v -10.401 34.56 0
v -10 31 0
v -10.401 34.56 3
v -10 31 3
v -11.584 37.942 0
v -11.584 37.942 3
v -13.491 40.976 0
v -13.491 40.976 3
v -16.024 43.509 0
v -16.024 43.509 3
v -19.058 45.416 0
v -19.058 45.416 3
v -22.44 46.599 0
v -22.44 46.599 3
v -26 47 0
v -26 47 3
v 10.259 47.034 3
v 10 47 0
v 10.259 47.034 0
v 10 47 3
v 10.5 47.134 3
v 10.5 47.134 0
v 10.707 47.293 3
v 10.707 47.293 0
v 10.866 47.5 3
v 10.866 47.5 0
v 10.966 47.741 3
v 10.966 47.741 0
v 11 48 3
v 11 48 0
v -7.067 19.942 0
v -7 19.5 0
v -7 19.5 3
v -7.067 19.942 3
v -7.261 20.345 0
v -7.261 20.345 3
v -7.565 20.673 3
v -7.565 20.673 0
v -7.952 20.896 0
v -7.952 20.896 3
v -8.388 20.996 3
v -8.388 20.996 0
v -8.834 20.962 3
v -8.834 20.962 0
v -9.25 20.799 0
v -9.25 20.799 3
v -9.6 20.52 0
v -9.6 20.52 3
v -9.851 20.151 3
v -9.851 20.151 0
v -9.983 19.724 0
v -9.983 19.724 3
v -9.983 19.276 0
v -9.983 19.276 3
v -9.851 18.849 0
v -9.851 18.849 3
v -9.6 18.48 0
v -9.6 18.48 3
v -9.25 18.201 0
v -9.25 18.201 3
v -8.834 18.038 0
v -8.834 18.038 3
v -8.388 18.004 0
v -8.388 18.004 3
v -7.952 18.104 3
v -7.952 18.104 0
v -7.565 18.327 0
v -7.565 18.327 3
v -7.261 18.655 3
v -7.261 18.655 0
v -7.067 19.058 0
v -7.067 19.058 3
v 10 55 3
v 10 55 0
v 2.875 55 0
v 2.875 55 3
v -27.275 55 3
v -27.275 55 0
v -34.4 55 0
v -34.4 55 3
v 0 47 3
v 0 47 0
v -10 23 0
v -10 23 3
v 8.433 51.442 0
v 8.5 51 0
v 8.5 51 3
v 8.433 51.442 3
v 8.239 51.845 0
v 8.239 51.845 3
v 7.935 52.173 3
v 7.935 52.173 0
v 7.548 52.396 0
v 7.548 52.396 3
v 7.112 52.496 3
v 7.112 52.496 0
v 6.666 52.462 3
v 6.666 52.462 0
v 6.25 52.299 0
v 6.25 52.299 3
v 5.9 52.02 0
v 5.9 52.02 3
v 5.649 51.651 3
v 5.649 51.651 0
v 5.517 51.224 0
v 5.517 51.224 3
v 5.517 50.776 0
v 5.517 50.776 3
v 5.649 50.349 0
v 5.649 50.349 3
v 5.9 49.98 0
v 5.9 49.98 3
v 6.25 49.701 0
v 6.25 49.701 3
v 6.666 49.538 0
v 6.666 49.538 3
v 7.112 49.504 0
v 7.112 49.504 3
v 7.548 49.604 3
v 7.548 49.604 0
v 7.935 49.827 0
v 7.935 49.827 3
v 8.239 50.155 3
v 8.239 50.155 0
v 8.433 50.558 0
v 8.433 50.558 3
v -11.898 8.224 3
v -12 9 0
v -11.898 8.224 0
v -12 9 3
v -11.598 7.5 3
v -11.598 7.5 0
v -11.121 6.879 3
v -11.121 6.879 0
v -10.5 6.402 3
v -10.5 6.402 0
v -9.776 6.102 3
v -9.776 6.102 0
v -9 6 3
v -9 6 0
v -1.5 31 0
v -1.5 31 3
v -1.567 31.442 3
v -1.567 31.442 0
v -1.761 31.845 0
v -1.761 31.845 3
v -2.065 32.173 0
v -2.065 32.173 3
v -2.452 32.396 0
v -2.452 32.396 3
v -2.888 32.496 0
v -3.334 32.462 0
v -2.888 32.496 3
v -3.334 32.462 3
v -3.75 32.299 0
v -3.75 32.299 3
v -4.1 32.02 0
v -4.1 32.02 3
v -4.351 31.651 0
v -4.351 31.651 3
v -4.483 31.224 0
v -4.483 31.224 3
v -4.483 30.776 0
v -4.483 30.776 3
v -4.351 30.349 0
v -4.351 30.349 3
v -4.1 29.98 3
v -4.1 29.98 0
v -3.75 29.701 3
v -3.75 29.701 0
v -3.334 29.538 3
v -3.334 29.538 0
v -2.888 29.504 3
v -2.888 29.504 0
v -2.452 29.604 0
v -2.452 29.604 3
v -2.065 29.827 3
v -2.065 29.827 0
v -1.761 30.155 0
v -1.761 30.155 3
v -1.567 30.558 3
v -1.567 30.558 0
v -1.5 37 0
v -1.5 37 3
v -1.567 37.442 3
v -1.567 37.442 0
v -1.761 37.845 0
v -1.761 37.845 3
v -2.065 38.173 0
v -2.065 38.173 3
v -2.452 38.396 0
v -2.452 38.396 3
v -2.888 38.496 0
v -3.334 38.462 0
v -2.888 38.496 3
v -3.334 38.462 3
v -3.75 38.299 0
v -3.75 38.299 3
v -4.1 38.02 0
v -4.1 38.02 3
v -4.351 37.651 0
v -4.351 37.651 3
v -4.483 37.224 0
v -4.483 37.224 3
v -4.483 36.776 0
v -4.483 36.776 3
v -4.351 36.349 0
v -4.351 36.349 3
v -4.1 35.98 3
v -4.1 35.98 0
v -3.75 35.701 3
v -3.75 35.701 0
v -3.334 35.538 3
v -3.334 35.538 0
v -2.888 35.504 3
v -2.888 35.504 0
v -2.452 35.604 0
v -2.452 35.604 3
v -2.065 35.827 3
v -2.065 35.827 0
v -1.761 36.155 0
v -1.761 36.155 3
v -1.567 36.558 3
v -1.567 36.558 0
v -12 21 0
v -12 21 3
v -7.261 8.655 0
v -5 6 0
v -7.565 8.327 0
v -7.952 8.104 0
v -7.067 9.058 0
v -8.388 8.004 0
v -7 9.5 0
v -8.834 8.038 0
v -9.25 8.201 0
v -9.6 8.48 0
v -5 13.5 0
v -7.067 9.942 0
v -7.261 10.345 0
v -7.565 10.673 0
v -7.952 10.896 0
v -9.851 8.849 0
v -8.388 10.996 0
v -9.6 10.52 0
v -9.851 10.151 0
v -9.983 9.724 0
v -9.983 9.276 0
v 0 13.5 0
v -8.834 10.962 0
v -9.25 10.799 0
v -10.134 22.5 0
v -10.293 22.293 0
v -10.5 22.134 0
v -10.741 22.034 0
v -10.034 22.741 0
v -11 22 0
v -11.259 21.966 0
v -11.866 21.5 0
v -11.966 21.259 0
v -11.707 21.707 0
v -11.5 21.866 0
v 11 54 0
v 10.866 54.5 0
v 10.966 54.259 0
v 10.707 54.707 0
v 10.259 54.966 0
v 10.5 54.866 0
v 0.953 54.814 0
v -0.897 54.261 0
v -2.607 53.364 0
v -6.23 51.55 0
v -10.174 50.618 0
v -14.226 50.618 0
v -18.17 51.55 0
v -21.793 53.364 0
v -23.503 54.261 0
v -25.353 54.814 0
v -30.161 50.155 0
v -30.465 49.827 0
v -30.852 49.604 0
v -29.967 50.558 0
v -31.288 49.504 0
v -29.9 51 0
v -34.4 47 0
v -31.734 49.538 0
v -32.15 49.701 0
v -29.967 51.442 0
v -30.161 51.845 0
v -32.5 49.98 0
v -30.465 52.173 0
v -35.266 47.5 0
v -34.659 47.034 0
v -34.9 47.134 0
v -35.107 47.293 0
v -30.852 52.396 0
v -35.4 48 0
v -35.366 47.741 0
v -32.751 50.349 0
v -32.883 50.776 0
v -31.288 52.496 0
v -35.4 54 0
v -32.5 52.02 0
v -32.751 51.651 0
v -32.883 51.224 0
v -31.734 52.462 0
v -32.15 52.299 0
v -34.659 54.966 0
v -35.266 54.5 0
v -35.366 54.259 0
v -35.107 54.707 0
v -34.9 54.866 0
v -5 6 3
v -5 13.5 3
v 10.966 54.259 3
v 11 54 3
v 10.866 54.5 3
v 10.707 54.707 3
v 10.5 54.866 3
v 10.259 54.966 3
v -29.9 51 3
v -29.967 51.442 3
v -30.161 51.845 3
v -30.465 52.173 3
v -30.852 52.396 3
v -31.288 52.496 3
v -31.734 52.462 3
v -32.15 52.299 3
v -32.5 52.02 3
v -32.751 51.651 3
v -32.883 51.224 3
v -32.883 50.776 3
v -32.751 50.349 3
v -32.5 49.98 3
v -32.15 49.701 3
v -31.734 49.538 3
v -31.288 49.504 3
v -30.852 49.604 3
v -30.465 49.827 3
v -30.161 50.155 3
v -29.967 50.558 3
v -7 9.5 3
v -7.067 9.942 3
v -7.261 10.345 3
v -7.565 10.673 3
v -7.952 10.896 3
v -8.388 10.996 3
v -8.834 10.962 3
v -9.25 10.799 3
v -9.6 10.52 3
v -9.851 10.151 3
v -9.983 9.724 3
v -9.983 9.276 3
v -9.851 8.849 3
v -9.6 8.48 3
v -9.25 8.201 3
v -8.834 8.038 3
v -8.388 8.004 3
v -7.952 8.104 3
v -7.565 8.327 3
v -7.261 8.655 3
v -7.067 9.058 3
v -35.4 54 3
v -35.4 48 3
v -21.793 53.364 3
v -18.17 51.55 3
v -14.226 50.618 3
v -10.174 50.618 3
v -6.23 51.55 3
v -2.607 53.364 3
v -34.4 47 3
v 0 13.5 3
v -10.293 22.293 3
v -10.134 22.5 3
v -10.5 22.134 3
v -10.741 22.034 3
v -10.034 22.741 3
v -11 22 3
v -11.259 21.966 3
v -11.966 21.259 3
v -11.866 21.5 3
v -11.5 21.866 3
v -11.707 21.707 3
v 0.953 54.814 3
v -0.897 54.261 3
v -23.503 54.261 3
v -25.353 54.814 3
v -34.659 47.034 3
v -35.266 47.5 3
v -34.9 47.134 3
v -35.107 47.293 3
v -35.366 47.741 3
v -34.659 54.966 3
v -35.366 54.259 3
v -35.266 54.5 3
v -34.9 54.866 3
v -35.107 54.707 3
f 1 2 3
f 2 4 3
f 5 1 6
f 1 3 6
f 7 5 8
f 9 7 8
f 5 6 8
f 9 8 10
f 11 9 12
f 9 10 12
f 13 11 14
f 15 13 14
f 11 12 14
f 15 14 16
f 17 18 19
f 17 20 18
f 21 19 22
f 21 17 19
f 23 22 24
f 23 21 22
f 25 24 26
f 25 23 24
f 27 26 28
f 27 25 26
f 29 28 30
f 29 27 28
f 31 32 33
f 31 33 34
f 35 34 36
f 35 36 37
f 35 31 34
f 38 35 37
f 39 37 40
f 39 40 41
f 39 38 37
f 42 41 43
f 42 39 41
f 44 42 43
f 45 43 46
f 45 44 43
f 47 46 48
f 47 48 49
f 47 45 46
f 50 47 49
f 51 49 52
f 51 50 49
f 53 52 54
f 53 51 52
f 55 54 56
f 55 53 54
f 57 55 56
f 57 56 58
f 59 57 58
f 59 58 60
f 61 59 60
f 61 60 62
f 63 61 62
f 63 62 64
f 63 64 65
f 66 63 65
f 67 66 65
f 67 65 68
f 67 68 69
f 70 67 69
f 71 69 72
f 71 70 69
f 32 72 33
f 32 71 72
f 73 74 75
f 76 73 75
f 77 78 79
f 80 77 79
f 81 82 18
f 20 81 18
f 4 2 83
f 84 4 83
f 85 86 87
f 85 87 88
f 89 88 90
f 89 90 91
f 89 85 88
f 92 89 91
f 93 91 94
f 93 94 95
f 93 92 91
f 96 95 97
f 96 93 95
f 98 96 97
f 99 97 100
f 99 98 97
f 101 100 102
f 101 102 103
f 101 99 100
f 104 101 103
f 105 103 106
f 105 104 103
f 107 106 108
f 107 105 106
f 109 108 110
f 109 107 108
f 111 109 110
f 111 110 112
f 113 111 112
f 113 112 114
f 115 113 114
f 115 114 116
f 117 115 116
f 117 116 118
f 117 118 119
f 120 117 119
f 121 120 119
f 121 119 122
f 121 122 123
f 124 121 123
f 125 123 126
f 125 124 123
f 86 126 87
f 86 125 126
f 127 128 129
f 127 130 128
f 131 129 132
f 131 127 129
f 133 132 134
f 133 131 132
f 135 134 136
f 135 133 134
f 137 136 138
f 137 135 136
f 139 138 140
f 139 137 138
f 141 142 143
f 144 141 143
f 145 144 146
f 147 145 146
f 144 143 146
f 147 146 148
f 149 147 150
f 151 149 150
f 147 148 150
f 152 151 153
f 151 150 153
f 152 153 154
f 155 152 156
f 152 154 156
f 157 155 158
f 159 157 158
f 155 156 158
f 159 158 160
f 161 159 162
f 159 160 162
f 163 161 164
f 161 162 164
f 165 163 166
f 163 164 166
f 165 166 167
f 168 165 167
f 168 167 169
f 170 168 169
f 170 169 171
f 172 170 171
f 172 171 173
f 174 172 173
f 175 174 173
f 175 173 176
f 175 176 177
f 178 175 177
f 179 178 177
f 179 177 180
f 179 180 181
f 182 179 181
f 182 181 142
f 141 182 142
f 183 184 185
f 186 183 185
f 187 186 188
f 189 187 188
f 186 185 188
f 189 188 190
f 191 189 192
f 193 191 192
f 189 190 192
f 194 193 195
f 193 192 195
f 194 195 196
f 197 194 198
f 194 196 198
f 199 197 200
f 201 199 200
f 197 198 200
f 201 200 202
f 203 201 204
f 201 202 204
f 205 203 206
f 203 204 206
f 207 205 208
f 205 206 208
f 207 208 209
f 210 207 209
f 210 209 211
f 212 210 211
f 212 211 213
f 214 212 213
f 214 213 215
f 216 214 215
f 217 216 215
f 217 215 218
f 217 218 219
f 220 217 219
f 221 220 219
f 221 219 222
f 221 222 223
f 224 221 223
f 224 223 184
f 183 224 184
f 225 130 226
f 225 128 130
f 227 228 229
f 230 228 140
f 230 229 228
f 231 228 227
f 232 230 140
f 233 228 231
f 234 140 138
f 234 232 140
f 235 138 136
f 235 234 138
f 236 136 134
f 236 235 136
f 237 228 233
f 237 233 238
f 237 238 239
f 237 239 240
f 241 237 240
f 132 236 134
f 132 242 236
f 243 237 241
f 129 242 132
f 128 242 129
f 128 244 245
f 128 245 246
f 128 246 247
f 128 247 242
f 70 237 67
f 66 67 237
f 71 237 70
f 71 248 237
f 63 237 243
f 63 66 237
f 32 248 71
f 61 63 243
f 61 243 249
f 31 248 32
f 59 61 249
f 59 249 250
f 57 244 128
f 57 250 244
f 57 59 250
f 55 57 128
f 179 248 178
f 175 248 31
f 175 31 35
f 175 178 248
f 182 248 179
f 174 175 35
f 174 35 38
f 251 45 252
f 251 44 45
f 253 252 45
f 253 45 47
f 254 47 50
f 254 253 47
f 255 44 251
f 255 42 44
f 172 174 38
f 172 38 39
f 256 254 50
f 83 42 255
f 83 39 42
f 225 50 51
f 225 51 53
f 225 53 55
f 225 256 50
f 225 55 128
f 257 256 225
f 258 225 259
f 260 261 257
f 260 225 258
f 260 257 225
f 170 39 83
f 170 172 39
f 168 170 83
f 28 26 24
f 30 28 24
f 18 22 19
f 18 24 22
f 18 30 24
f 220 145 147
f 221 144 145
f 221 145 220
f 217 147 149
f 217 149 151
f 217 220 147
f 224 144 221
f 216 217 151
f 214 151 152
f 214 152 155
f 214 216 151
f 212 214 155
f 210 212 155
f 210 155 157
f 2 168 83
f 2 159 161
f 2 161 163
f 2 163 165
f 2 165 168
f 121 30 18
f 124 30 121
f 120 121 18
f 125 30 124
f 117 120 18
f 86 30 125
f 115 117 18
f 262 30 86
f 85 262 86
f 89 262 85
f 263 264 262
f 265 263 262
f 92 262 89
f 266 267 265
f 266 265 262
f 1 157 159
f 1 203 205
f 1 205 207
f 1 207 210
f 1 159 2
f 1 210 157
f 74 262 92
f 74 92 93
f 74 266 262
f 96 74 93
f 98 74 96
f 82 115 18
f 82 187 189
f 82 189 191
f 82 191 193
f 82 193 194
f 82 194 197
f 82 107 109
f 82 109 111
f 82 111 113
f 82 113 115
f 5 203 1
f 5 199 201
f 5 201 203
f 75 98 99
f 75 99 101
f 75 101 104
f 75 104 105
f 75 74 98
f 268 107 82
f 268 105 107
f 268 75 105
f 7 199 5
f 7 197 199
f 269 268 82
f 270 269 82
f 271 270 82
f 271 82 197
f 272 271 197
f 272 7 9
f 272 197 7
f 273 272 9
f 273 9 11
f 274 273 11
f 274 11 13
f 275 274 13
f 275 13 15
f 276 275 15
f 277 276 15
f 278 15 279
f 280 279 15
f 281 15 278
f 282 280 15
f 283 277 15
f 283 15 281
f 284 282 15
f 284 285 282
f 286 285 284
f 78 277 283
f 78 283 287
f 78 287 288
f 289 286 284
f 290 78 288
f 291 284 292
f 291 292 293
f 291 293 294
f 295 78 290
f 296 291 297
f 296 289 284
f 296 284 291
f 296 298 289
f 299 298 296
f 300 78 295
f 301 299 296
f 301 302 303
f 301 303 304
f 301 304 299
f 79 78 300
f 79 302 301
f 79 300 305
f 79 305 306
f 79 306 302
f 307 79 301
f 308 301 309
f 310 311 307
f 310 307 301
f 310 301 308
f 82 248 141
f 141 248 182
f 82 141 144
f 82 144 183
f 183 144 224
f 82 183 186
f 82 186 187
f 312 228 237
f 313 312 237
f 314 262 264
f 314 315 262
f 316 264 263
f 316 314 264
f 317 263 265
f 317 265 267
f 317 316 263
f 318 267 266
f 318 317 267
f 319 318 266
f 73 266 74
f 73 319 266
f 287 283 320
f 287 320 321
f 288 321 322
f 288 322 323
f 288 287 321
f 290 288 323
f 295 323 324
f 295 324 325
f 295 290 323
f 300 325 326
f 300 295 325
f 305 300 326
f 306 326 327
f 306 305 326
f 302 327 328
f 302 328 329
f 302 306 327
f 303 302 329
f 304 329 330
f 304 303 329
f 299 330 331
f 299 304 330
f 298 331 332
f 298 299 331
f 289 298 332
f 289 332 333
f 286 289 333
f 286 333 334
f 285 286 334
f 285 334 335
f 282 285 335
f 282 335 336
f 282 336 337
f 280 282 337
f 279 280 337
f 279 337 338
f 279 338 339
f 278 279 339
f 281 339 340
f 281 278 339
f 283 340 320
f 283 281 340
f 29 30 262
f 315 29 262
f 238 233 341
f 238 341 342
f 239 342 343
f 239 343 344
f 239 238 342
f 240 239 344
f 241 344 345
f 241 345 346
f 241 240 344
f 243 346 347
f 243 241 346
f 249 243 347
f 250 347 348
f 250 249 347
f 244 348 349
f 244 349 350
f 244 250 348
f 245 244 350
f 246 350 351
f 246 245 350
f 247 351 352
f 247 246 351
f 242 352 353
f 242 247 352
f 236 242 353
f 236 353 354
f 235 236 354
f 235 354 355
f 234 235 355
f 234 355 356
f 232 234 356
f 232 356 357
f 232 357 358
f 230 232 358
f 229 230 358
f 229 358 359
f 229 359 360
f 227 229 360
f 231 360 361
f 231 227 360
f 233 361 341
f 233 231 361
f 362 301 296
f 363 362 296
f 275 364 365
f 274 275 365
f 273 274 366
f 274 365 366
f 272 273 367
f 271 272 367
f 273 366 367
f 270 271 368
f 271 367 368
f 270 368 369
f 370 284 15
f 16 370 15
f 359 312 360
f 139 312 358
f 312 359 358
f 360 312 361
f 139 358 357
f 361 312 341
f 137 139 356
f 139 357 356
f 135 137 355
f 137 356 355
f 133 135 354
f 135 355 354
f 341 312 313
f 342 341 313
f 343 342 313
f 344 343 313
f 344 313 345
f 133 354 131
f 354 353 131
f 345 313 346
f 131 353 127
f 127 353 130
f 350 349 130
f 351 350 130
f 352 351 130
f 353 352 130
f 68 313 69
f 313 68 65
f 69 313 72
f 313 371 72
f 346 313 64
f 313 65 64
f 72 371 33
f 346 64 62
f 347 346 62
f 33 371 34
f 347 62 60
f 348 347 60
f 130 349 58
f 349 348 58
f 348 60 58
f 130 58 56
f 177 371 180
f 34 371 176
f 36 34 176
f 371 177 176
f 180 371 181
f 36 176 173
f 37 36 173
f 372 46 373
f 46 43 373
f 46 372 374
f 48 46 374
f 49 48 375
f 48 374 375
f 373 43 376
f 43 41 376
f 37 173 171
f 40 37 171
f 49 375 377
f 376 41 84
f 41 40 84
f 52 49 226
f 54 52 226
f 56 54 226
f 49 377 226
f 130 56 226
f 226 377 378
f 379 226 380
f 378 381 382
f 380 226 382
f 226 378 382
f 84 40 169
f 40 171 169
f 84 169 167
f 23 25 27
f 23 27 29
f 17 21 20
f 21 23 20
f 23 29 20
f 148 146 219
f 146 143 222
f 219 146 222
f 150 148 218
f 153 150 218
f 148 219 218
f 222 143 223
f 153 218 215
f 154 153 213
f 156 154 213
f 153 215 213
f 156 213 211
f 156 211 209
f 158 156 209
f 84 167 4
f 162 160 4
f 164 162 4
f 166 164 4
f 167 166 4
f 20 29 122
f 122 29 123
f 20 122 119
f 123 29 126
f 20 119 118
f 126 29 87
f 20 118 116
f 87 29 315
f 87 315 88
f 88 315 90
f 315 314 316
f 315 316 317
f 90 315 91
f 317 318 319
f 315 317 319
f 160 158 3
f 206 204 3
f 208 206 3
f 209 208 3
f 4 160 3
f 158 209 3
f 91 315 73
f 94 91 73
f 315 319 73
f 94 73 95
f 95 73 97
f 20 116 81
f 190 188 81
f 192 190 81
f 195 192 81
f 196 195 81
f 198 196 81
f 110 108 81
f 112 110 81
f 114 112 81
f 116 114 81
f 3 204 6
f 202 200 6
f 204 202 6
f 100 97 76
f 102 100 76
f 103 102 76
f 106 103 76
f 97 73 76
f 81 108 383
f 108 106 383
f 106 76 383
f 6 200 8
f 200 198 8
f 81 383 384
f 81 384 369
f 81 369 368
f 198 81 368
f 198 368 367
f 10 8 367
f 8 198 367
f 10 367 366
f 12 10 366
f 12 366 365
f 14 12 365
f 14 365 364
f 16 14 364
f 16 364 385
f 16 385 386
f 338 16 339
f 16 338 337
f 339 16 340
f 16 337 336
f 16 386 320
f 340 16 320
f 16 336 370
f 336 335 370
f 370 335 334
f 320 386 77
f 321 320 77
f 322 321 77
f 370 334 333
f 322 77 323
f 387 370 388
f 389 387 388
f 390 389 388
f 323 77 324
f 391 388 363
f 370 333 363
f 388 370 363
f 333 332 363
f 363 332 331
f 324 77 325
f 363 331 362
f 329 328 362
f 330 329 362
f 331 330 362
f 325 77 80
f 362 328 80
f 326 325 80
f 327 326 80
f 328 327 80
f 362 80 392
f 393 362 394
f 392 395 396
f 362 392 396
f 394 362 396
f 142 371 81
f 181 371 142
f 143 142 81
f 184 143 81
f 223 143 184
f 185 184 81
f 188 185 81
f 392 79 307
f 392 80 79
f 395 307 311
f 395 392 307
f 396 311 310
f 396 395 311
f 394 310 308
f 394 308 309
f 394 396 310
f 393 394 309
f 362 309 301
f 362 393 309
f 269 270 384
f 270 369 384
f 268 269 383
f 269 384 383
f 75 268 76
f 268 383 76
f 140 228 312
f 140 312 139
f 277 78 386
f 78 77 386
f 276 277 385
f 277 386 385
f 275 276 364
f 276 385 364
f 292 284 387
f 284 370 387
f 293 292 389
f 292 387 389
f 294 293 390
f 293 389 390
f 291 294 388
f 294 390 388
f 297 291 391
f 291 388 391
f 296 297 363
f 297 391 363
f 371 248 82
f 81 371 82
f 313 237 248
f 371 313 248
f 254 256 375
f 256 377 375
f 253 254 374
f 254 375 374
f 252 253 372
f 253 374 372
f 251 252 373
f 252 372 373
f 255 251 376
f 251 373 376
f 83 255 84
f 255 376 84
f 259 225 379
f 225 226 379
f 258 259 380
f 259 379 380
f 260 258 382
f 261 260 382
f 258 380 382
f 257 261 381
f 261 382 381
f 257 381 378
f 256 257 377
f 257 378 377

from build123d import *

# Parameters (mm, degrees)
SKETCH_1_R          = 1.5
EXTRUDE_1_DEPTH     = 3
FILLET_1_R          = 1
FILLET_4_R          = 16
SKETCH_2_R          = 17.5
CUT_EXTRUDE_1_DEPTH = 3
FILLET_5_R          = 10
SKETCH_3_W          = 10
SKETCH_3_H          = 7
CUT_EXTRUDE_2_DEPTH = 10
SKETCH_4_W          = 7
SKETCH_4_H          = 1
EXTRUDE_2_DEPTH     = 3
FILLET_7_R          = 3
SKETCH_5_R          = 1.5
CUT_EXTRUDE_3_DEPTH = 10


with BuildPart() as part:
    # 草图1 → 凸台-拉伸1 (new body)
    with BuildSketch(Plane.XY):
        Polygon((0, 0), (0, 3.5), (-5, 3.5), (-5, 13.5), (0, 13.5), (0, 47), (11, 47), (11, 55), (-35.4, 55), (-35.4, 47), (-10, 47), (-10, 22), (-12, 22), (-12, 7), (-10, 7), (-10, 0), align=None)
        with Locations((7, 51)):
            Circle(SKETCH_1_R, mode=Mode.SUBTRACT)
        with Locations((-31.4, 51)):
            Circle(SKETCH_1_R, mode=Mode.SUBTRACT)
        with Locations((-8.5, 19.5)):
            Circle(SKETCH_1_R, mode=Mode.SUBTRACT)
        with Locations((-8.5, 9.5)):
            Circle(SKETCH_1_R, mode=Mode.SUBTRACT)
    extrude(amount=EXTRUDE_1_DEPTH)

    # 圆角1
    fillet_1_edges = [part.edges().sort_by_distance(p)[0] for p in [
        (11, 55, 1.5),
        (11, 47, 1.5),
        (-35.4, 47, 1.5),
        (-35.4, 55, 1.5),
        (-10, 22, 1.5),
        (-12, 22, 1.5),
    ]]
    fillet(fillet_1_edges, radius=FILLET_1_R - 0.0001)  # a hair under: the kernel refuses the full size

    # 圆角4
    fillet_4_edges = [part.edges().sort_by_distance(p)[0] for p in [
        (-10, 47, 1.5),
    ]]
    fillet(fillet_4_edges, radius=FILLET_4_R)

    # 草图2 → 切除-拉伸1 (cut)
    with BuildSketch(Plane.XY.offset(3)):
        with Locations((-12.2, 68)):
            Circle(SKETCH_2_R)
    extrude(amount=-CUT_EXTRUDE_1_DEPTH, mode=Mode.SUBTRACT)

    # 圆角5
    fillet_5_edges = [part.edges().sort_by_distance(p)[0] for p in [
        (-23.915374514, 55, 1.5),
        (-0.484625486, 55, 1.5),
    ]]
    fillet(fillet_5_edges, radius=FILLET_5_R)

    # 草图3 → 切除-拉伸2 (cut)
    with BuildSketch(Plane(origin=(0, 0, 0), x_dir=(-1, 0, 0), z_dir=(0, 0, -1))):
        with Locations((5, 3.5)):
            Rectangle(SKETCH_3_W, SKETCH_3_H)
    extrude(amount=-CUT_EXTRUDE_2_DEPTH, mode=Mode.SUBTRACT)

    # 草图4 → 凸台-拉伸2 (add)
    with BuildSketch(Plane(origin=(0, 0, 0), x_dir=(-1, 0, 0), z_dir=(0, 0, -1))):
        with Locations((8.5, 6.5)):
            Rectangle(SKETCH_4_W, SKETCH_4_H)
    extrude(amount=-EXTRUDE_2_DEPTH)

    # 圆角7
    fillet_7_edges = [part.edges().sort_by_distance(p)[0] for p in [
        (-12, 6, 1.5),
    ]]
    fillet(fillet_7_edges, radius=FILLET_7_R)

    # 草图5 → 切除-拉伸3 (cut)
    with BuildSketch(Plane.XY.offset(3)):
        with Locations((-3, 31)):
            Circle(SKETCH_5_R)
        with Locations((-3, 37)):
            Circle(SKETCH_5_R)
    extrude(amount=-CUT_EXTRUDE_3_DEPTH, mode=Mode.SUBTRACT)


solid = part.part
